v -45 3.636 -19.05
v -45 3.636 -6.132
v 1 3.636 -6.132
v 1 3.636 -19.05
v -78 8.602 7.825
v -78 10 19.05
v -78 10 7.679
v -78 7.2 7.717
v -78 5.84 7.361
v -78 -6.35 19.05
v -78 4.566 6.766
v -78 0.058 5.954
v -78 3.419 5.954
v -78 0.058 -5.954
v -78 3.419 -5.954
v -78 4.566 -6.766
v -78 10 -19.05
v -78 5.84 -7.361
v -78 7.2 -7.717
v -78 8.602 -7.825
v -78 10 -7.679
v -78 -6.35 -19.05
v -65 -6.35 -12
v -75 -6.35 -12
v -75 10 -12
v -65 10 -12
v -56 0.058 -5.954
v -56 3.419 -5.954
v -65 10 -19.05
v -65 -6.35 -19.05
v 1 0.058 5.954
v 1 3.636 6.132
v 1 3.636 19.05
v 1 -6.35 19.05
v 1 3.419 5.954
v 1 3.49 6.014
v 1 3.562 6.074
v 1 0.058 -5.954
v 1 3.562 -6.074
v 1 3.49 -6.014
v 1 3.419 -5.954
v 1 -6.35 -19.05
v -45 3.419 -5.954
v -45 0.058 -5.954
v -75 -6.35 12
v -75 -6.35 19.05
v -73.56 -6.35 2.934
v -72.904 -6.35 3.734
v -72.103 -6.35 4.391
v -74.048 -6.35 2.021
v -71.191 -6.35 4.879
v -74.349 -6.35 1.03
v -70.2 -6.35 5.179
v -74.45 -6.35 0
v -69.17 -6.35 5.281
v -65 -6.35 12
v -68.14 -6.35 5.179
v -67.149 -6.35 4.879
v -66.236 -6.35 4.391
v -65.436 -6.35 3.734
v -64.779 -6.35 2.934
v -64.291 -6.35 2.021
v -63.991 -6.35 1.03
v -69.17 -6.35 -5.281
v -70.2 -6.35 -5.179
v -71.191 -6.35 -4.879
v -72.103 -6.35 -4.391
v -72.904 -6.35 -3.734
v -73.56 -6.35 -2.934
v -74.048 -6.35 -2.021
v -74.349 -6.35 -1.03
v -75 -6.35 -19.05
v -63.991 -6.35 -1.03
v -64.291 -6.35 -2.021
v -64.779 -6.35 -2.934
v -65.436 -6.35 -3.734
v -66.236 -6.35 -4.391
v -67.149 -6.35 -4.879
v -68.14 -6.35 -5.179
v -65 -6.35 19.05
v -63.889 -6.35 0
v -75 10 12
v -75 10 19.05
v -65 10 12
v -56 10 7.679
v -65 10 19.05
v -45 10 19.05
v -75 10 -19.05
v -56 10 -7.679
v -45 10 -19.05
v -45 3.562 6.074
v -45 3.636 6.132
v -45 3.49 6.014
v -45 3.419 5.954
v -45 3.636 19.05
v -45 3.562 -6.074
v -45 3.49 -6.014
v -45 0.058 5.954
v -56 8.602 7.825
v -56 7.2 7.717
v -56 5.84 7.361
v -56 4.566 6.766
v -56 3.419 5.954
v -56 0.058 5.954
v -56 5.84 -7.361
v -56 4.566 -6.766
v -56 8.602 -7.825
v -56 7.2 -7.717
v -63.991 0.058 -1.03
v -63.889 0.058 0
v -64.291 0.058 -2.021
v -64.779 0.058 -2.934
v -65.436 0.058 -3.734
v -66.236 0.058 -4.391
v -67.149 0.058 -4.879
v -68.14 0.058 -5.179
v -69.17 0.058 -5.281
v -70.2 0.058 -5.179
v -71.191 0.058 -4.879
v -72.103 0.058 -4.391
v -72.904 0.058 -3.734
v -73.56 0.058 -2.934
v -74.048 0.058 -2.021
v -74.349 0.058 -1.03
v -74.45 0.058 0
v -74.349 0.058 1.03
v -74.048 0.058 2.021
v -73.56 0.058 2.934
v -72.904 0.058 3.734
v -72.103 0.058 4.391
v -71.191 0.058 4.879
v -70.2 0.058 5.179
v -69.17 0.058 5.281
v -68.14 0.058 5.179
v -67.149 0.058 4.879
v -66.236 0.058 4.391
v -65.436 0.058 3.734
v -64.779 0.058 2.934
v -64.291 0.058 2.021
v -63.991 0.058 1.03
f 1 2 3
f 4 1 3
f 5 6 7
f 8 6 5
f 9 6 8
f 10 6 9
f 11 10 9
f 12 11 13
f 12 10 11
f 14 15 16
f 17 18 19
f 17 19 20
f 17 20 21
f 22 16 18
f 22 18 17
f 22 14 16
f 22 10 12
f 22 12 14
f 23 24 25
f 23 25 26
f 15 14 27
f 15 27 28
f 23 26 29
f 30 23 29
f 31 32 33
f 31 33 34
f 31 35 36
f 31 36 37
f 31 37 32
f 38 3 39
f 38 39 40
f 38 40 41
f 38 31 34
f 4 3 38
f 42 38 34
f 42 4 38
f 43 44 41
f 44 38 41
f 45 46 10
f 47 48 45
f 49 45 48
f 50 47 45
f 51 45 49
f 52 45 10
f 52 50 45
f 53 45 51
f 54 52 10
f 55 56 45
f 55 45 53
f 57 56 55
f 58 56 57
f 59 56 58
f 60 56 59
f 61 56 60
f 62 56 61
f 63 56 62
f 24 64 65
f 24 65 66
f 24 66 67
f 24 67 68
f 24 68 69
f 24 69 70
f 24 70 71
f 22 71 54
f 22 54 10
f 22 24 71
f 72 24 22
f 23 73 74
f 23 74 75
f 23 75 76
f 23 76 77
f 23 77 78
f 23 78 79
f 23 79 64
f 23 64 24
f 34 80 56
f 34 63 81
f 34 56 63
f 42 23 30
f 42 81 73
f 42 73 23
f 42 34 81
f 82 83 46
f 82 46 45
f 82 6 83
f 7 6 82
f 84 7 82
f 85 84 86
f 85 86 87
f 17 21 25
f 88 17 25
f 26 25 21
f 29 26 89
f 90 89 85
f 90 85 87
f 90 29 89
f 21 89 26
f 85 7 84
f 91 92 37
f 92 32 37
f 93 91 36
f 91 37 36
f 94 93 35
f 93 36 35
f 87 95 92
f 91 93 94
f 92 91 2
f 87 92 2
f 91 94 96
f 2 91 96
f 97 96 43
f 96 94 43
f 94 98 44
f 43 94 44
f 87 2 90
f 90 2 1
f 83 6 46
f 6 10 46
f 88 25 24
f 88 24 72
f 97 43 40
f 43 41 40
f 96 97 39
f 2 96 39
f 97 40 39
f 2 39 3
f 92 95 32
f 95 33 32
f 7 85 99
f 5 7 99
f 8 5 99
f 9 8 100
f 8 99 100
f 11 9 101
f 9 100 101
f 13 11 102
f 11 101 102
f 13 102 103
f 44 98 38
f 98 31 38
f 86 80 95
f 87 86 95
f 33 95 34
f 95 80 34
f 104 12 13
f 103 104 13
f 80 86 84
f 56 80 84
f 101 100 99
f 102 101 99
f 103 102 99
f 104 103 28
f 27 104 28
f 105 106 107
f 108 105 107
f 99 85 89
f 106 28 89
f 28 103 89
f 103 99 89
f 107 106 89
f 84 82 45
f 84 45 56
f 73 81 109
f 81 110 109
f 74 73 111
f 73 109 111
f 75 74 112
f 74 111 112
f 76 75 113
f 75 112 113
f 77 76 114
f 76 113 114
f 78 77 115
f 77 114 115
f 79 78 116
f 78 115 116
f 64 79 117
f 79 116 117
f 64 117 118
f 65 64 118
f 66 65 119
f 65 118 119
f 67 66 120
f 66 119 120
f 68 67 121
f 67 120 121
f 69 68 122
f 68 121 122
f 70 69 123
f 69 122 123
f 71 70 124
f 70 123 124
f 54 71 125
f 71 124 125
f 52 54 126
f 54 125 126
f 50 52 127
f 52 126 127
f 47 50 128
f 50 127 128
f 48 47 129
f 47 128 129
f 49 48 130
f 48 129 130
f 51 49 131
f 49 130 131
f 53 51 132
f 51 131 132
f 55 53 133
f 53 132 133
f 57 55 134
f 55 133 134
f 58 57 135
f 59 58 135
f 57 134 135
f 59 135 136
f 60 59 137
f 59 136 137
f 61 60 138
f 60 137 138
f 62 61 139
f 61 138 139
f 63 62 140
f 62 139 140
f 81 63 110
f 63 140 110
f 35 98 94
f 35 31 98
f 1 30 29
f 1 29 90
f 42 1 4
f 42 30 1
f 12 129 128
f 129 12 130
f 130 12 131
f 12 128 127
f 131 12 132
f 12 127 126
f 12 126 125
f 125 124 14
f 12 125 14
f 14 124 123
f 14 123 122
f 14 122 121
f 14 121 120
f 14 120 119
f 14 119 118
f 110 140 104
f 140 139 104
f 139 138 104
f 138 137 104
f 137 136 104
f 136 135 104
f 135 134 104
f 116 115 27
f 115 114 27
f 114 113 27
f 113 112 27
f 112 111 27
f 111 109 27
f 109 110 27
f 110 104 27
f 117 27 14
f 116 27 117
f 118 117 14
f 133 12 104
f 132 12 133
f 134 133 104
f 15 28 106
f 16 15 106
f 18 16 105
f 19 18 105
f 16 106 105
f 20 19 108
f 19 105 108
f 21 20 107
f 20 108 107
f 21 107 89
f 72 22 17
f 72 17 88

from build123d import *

# Parameters (mm, degrees)
SKETCH5_W                = 33.357089
SKETCH5_H                = 38.1
BOSS_EXTRUDE2_DEPTH      = 1
BOSS_EXTRUDE2_DEPTH_BACK = 78
SKETCH6_W                = 69
SKETCH6_H                = 23.371556831
CUT_EXTRUDE1_DEPTH       = 39.1
SKETCH7_R                = 7.825237577
CUT_EXTRUDE2_DEPTH       = 2
CUT_EXTRUDE2_DEPTH_BACK  = 79
CUT_EXTRUDE3_DEPTH       = 79
SKETCH9_W                = 33
SKETCH9_H                = 38.1
BOSS_EXTRUDE6_DEPTH      = 10
SKETCH11_R               = 7.825237577
CUT_EXTRUDE5_DEPTH       = 79
SKETCH13_W               = 10
SKETCH13_H               = 25.4
CUT_EXTRUDE6_DEPTH       = 11
CUT_EXTRUDE6_DEPTH_BACK  = 7.35
SKETCH14_W               = 11.907690598
SKETCH14_H               = 40
CUT_EXTRUDE8_DEPTH       = 2
CUT_EXTRUDE8_DEPTH_BACK  = 90
SKETCH15_R               = 5.280529318
CUT_EXTRUDE9_DEPTH       = 90
CUT_EXTRUDE9_DEPTH_BACK  = 90
SKETCH16_W               = 38.1
SKETCH16_H               = 16.35
BOSS_EXTRUDE7_DEPTH      = 11


with BuildPart() as part:
    # Sketch5 → Boss-Extrude2 (new body, two sides)
    with BuildSketch(Plane(origin=(0, 0, 0), x_dir=(0, -1, 0), z_dir=(1, 0, 0))) as boss_extrude2_sk:
        with Locations((-10.3285445, 0)):
            Rectangle(SKETCH5_W, SKETCH5_H)
    extrude(amount=BOSS_EXTRUDE2_DEPTH)
    extrude(boss_extrude2_sk.sketch, amount=-BOSS_EXTRUDE2_DEPTH_BACK)

    # Sketch6 → Cut-Extrude1 (cut, through all)
    with BuildSketch(Plane.XY.offset(19.05)):
        with Locations((-33.5, 15.321310585)):
            Rectangle(SKETCH6_W, SKETCH6_H)
    extrude(amount=-CUT_EXTRUDE1_DEPTH, mode=Mode.SUBTRACT)

    # Sketch7 → Cut-Extrude2 (cut, two sides)
    with BuildSketch(Plane(origin=(0, 0, 0), x_dir=(0, 0, -1), z_dir=(1, 0, 0))) as cut_extrude2_sk:
        with Locations((0, 8.496530467)):
            Circle(SKETCH7_R)
    extrude(amount=CUT_EXTRUDE2_DEPTH, mode=Mode.SUBTRACT)
    extrude(cut_extrude2_sk.sketch, amount=-CUT_EXTRUDE2_DEPTH_BACK, mode=Mode.SUBTRACT)

    # Sketch8 → Cut-Extrude3 (cut, through all)
    with BuildSketch(Plane(origin=(0, 0, 0), x_dir=(0, 0, -1), z_dir=(1, 0, 0))):
        with BuildLine():
            Line((-19.05, 3.635532169), (-6.132294733, 3.635532169))
            ThreePointArc((-6.132294733, 3.635532169), (0, 16.321768044), (6.132294733, 3.635532169))
            Line((6.132294733, 3.635532169), (19.05, 3.635532169))
            Line((19.05, 3.635532169), (19.05, 27.007089))
            Line((19.05, 27.007089), (-19.05, 27.007089))
            Line((-19.05, 27.007089), (-19.05, 3.635532169))
        make_face()
        with BuildLine():
            Line((-19.05, 3.635532169), (-6.132294733, 3.635532169))
            ThreePointArc((-6.132294733, 3.635532169), (0, 16.321768044), (6.132294733, 3.635532169))
            Line((6.132294733, 3.635532169), (19.05, 3.635532169))
            Line((19.05, 3.635532169), (19.05, 27.007089))
            Line((19.05, 27.007089), (-19.05, 27.007089))
            Line((-19.05, 27.007089), (-19.05, 3.635532169))
        make_face()
    extrude(amount=-CUT_EXTRUDE3_DEPTH, mode=Mode.SUBTRACT)

    # Sketch9 → Boss-Extrude6 (add)
    with BuildSketch(Plane(origin=(0, 0, 0), x_dir=(1, 0, 0), z_dir=(0, 1, 0))):
        with Locations((-61.5, 0)):
            Rectangle(SKETCH9_W, SKETCH9_H)
    extrude(amount=BOSS_EXTRUDE6_DEPTH)

    # Sketch11 → Cut-Extrude5 (cut, through all)
    with BuildSketch(Plane(origin=(0, 0, 0), x_dir=(0, 0, -1), z_dir=(1, 0, 0))):
        with Locations((0, 8.496530467)):
            Circle(SKETCH11_R)
    extrude(amount=-CUT_EXTRUDE5_DEPTH, mode=Mode.SUBTRACT)

    # Sketch13 → Cut-Extrude6 (cut, two sides)
    with BuildSketch(Plane(origin=(0, 0, 0), x_dir=(1, 0, 0), z_dir=(0, 1, 0))) as cut_extrude6_sk:
        with Locations((-70, -24.7)):
            Rectangle(SKETCH13_W, SKETCH13_H)
        with Locations((-70, 24.7)):
            Rectangle(SKETCH13_W, SKETCH13_H)
    extrude(amount=CUT_EXTRUDE6_DEPTH, mode=Mode.SUBTRACT)
    extrude(cut_extrude6_sk.sketch, amount=-CUT_EXTRUDE6_DEPTH_BACK, mode=Mode.SUBTRACT)

    # Sketch14 → Cut-Extrude8 (cut, two sides)
    with BuildSketch(Plane(origin=(0, 0, 0), x_dir=(0, 0, -1), z_dir=(1, 0, 0))) as cut_extrude8_sk:
        with Locations((0, 20.05843463)):
            Rectangle(SKETCH14_W, SKETCH14_H)
    extrude(amount=CUT_EXTRUDE8_DEPTH, mode=Mode.SUBTRACT)
    extrude(cut_extrude8_sk.sketch, amount=-CUT_EXTRUDE8_DEPTH_BACK, mode=Mode.SUBTRACT)

    # Sketch15 → Cut-Extrude9 (cut, two sides)
    with BuildSketch(Plane(origin=(0, 0, 0), x_dir=(1, 0, 0), z_dir=(0, 1, 0))) as cut_extrude9_sk:
        with Locations((-69.169741906, 0)):
            Circle(SKETCH15_R)
    extrude(amount=CUT_EXTRUDE9_DEPTH, mode=Mode.SUBTRACT)
    extrude(cut_extrude9_sk.sketch, amount=-CUT_EXTRUDE9_DEPTH_BACK, mode=Mode.SUBTRACT)

    # Sketch16 → Boss-Extrude7 (add)
    with BuildSketch(Plane(origin=(-45, 0, 0), x_dir=(0, 0, -1), z_dir=(1, 0, 0))):
        with Locations((0, 1.825)):
            Rectangle(SKETCH16_W, SKETCH16_H)
    extrude(amount=-BOSS_EXTRUDE7_DEPTH)


solid = part.part
